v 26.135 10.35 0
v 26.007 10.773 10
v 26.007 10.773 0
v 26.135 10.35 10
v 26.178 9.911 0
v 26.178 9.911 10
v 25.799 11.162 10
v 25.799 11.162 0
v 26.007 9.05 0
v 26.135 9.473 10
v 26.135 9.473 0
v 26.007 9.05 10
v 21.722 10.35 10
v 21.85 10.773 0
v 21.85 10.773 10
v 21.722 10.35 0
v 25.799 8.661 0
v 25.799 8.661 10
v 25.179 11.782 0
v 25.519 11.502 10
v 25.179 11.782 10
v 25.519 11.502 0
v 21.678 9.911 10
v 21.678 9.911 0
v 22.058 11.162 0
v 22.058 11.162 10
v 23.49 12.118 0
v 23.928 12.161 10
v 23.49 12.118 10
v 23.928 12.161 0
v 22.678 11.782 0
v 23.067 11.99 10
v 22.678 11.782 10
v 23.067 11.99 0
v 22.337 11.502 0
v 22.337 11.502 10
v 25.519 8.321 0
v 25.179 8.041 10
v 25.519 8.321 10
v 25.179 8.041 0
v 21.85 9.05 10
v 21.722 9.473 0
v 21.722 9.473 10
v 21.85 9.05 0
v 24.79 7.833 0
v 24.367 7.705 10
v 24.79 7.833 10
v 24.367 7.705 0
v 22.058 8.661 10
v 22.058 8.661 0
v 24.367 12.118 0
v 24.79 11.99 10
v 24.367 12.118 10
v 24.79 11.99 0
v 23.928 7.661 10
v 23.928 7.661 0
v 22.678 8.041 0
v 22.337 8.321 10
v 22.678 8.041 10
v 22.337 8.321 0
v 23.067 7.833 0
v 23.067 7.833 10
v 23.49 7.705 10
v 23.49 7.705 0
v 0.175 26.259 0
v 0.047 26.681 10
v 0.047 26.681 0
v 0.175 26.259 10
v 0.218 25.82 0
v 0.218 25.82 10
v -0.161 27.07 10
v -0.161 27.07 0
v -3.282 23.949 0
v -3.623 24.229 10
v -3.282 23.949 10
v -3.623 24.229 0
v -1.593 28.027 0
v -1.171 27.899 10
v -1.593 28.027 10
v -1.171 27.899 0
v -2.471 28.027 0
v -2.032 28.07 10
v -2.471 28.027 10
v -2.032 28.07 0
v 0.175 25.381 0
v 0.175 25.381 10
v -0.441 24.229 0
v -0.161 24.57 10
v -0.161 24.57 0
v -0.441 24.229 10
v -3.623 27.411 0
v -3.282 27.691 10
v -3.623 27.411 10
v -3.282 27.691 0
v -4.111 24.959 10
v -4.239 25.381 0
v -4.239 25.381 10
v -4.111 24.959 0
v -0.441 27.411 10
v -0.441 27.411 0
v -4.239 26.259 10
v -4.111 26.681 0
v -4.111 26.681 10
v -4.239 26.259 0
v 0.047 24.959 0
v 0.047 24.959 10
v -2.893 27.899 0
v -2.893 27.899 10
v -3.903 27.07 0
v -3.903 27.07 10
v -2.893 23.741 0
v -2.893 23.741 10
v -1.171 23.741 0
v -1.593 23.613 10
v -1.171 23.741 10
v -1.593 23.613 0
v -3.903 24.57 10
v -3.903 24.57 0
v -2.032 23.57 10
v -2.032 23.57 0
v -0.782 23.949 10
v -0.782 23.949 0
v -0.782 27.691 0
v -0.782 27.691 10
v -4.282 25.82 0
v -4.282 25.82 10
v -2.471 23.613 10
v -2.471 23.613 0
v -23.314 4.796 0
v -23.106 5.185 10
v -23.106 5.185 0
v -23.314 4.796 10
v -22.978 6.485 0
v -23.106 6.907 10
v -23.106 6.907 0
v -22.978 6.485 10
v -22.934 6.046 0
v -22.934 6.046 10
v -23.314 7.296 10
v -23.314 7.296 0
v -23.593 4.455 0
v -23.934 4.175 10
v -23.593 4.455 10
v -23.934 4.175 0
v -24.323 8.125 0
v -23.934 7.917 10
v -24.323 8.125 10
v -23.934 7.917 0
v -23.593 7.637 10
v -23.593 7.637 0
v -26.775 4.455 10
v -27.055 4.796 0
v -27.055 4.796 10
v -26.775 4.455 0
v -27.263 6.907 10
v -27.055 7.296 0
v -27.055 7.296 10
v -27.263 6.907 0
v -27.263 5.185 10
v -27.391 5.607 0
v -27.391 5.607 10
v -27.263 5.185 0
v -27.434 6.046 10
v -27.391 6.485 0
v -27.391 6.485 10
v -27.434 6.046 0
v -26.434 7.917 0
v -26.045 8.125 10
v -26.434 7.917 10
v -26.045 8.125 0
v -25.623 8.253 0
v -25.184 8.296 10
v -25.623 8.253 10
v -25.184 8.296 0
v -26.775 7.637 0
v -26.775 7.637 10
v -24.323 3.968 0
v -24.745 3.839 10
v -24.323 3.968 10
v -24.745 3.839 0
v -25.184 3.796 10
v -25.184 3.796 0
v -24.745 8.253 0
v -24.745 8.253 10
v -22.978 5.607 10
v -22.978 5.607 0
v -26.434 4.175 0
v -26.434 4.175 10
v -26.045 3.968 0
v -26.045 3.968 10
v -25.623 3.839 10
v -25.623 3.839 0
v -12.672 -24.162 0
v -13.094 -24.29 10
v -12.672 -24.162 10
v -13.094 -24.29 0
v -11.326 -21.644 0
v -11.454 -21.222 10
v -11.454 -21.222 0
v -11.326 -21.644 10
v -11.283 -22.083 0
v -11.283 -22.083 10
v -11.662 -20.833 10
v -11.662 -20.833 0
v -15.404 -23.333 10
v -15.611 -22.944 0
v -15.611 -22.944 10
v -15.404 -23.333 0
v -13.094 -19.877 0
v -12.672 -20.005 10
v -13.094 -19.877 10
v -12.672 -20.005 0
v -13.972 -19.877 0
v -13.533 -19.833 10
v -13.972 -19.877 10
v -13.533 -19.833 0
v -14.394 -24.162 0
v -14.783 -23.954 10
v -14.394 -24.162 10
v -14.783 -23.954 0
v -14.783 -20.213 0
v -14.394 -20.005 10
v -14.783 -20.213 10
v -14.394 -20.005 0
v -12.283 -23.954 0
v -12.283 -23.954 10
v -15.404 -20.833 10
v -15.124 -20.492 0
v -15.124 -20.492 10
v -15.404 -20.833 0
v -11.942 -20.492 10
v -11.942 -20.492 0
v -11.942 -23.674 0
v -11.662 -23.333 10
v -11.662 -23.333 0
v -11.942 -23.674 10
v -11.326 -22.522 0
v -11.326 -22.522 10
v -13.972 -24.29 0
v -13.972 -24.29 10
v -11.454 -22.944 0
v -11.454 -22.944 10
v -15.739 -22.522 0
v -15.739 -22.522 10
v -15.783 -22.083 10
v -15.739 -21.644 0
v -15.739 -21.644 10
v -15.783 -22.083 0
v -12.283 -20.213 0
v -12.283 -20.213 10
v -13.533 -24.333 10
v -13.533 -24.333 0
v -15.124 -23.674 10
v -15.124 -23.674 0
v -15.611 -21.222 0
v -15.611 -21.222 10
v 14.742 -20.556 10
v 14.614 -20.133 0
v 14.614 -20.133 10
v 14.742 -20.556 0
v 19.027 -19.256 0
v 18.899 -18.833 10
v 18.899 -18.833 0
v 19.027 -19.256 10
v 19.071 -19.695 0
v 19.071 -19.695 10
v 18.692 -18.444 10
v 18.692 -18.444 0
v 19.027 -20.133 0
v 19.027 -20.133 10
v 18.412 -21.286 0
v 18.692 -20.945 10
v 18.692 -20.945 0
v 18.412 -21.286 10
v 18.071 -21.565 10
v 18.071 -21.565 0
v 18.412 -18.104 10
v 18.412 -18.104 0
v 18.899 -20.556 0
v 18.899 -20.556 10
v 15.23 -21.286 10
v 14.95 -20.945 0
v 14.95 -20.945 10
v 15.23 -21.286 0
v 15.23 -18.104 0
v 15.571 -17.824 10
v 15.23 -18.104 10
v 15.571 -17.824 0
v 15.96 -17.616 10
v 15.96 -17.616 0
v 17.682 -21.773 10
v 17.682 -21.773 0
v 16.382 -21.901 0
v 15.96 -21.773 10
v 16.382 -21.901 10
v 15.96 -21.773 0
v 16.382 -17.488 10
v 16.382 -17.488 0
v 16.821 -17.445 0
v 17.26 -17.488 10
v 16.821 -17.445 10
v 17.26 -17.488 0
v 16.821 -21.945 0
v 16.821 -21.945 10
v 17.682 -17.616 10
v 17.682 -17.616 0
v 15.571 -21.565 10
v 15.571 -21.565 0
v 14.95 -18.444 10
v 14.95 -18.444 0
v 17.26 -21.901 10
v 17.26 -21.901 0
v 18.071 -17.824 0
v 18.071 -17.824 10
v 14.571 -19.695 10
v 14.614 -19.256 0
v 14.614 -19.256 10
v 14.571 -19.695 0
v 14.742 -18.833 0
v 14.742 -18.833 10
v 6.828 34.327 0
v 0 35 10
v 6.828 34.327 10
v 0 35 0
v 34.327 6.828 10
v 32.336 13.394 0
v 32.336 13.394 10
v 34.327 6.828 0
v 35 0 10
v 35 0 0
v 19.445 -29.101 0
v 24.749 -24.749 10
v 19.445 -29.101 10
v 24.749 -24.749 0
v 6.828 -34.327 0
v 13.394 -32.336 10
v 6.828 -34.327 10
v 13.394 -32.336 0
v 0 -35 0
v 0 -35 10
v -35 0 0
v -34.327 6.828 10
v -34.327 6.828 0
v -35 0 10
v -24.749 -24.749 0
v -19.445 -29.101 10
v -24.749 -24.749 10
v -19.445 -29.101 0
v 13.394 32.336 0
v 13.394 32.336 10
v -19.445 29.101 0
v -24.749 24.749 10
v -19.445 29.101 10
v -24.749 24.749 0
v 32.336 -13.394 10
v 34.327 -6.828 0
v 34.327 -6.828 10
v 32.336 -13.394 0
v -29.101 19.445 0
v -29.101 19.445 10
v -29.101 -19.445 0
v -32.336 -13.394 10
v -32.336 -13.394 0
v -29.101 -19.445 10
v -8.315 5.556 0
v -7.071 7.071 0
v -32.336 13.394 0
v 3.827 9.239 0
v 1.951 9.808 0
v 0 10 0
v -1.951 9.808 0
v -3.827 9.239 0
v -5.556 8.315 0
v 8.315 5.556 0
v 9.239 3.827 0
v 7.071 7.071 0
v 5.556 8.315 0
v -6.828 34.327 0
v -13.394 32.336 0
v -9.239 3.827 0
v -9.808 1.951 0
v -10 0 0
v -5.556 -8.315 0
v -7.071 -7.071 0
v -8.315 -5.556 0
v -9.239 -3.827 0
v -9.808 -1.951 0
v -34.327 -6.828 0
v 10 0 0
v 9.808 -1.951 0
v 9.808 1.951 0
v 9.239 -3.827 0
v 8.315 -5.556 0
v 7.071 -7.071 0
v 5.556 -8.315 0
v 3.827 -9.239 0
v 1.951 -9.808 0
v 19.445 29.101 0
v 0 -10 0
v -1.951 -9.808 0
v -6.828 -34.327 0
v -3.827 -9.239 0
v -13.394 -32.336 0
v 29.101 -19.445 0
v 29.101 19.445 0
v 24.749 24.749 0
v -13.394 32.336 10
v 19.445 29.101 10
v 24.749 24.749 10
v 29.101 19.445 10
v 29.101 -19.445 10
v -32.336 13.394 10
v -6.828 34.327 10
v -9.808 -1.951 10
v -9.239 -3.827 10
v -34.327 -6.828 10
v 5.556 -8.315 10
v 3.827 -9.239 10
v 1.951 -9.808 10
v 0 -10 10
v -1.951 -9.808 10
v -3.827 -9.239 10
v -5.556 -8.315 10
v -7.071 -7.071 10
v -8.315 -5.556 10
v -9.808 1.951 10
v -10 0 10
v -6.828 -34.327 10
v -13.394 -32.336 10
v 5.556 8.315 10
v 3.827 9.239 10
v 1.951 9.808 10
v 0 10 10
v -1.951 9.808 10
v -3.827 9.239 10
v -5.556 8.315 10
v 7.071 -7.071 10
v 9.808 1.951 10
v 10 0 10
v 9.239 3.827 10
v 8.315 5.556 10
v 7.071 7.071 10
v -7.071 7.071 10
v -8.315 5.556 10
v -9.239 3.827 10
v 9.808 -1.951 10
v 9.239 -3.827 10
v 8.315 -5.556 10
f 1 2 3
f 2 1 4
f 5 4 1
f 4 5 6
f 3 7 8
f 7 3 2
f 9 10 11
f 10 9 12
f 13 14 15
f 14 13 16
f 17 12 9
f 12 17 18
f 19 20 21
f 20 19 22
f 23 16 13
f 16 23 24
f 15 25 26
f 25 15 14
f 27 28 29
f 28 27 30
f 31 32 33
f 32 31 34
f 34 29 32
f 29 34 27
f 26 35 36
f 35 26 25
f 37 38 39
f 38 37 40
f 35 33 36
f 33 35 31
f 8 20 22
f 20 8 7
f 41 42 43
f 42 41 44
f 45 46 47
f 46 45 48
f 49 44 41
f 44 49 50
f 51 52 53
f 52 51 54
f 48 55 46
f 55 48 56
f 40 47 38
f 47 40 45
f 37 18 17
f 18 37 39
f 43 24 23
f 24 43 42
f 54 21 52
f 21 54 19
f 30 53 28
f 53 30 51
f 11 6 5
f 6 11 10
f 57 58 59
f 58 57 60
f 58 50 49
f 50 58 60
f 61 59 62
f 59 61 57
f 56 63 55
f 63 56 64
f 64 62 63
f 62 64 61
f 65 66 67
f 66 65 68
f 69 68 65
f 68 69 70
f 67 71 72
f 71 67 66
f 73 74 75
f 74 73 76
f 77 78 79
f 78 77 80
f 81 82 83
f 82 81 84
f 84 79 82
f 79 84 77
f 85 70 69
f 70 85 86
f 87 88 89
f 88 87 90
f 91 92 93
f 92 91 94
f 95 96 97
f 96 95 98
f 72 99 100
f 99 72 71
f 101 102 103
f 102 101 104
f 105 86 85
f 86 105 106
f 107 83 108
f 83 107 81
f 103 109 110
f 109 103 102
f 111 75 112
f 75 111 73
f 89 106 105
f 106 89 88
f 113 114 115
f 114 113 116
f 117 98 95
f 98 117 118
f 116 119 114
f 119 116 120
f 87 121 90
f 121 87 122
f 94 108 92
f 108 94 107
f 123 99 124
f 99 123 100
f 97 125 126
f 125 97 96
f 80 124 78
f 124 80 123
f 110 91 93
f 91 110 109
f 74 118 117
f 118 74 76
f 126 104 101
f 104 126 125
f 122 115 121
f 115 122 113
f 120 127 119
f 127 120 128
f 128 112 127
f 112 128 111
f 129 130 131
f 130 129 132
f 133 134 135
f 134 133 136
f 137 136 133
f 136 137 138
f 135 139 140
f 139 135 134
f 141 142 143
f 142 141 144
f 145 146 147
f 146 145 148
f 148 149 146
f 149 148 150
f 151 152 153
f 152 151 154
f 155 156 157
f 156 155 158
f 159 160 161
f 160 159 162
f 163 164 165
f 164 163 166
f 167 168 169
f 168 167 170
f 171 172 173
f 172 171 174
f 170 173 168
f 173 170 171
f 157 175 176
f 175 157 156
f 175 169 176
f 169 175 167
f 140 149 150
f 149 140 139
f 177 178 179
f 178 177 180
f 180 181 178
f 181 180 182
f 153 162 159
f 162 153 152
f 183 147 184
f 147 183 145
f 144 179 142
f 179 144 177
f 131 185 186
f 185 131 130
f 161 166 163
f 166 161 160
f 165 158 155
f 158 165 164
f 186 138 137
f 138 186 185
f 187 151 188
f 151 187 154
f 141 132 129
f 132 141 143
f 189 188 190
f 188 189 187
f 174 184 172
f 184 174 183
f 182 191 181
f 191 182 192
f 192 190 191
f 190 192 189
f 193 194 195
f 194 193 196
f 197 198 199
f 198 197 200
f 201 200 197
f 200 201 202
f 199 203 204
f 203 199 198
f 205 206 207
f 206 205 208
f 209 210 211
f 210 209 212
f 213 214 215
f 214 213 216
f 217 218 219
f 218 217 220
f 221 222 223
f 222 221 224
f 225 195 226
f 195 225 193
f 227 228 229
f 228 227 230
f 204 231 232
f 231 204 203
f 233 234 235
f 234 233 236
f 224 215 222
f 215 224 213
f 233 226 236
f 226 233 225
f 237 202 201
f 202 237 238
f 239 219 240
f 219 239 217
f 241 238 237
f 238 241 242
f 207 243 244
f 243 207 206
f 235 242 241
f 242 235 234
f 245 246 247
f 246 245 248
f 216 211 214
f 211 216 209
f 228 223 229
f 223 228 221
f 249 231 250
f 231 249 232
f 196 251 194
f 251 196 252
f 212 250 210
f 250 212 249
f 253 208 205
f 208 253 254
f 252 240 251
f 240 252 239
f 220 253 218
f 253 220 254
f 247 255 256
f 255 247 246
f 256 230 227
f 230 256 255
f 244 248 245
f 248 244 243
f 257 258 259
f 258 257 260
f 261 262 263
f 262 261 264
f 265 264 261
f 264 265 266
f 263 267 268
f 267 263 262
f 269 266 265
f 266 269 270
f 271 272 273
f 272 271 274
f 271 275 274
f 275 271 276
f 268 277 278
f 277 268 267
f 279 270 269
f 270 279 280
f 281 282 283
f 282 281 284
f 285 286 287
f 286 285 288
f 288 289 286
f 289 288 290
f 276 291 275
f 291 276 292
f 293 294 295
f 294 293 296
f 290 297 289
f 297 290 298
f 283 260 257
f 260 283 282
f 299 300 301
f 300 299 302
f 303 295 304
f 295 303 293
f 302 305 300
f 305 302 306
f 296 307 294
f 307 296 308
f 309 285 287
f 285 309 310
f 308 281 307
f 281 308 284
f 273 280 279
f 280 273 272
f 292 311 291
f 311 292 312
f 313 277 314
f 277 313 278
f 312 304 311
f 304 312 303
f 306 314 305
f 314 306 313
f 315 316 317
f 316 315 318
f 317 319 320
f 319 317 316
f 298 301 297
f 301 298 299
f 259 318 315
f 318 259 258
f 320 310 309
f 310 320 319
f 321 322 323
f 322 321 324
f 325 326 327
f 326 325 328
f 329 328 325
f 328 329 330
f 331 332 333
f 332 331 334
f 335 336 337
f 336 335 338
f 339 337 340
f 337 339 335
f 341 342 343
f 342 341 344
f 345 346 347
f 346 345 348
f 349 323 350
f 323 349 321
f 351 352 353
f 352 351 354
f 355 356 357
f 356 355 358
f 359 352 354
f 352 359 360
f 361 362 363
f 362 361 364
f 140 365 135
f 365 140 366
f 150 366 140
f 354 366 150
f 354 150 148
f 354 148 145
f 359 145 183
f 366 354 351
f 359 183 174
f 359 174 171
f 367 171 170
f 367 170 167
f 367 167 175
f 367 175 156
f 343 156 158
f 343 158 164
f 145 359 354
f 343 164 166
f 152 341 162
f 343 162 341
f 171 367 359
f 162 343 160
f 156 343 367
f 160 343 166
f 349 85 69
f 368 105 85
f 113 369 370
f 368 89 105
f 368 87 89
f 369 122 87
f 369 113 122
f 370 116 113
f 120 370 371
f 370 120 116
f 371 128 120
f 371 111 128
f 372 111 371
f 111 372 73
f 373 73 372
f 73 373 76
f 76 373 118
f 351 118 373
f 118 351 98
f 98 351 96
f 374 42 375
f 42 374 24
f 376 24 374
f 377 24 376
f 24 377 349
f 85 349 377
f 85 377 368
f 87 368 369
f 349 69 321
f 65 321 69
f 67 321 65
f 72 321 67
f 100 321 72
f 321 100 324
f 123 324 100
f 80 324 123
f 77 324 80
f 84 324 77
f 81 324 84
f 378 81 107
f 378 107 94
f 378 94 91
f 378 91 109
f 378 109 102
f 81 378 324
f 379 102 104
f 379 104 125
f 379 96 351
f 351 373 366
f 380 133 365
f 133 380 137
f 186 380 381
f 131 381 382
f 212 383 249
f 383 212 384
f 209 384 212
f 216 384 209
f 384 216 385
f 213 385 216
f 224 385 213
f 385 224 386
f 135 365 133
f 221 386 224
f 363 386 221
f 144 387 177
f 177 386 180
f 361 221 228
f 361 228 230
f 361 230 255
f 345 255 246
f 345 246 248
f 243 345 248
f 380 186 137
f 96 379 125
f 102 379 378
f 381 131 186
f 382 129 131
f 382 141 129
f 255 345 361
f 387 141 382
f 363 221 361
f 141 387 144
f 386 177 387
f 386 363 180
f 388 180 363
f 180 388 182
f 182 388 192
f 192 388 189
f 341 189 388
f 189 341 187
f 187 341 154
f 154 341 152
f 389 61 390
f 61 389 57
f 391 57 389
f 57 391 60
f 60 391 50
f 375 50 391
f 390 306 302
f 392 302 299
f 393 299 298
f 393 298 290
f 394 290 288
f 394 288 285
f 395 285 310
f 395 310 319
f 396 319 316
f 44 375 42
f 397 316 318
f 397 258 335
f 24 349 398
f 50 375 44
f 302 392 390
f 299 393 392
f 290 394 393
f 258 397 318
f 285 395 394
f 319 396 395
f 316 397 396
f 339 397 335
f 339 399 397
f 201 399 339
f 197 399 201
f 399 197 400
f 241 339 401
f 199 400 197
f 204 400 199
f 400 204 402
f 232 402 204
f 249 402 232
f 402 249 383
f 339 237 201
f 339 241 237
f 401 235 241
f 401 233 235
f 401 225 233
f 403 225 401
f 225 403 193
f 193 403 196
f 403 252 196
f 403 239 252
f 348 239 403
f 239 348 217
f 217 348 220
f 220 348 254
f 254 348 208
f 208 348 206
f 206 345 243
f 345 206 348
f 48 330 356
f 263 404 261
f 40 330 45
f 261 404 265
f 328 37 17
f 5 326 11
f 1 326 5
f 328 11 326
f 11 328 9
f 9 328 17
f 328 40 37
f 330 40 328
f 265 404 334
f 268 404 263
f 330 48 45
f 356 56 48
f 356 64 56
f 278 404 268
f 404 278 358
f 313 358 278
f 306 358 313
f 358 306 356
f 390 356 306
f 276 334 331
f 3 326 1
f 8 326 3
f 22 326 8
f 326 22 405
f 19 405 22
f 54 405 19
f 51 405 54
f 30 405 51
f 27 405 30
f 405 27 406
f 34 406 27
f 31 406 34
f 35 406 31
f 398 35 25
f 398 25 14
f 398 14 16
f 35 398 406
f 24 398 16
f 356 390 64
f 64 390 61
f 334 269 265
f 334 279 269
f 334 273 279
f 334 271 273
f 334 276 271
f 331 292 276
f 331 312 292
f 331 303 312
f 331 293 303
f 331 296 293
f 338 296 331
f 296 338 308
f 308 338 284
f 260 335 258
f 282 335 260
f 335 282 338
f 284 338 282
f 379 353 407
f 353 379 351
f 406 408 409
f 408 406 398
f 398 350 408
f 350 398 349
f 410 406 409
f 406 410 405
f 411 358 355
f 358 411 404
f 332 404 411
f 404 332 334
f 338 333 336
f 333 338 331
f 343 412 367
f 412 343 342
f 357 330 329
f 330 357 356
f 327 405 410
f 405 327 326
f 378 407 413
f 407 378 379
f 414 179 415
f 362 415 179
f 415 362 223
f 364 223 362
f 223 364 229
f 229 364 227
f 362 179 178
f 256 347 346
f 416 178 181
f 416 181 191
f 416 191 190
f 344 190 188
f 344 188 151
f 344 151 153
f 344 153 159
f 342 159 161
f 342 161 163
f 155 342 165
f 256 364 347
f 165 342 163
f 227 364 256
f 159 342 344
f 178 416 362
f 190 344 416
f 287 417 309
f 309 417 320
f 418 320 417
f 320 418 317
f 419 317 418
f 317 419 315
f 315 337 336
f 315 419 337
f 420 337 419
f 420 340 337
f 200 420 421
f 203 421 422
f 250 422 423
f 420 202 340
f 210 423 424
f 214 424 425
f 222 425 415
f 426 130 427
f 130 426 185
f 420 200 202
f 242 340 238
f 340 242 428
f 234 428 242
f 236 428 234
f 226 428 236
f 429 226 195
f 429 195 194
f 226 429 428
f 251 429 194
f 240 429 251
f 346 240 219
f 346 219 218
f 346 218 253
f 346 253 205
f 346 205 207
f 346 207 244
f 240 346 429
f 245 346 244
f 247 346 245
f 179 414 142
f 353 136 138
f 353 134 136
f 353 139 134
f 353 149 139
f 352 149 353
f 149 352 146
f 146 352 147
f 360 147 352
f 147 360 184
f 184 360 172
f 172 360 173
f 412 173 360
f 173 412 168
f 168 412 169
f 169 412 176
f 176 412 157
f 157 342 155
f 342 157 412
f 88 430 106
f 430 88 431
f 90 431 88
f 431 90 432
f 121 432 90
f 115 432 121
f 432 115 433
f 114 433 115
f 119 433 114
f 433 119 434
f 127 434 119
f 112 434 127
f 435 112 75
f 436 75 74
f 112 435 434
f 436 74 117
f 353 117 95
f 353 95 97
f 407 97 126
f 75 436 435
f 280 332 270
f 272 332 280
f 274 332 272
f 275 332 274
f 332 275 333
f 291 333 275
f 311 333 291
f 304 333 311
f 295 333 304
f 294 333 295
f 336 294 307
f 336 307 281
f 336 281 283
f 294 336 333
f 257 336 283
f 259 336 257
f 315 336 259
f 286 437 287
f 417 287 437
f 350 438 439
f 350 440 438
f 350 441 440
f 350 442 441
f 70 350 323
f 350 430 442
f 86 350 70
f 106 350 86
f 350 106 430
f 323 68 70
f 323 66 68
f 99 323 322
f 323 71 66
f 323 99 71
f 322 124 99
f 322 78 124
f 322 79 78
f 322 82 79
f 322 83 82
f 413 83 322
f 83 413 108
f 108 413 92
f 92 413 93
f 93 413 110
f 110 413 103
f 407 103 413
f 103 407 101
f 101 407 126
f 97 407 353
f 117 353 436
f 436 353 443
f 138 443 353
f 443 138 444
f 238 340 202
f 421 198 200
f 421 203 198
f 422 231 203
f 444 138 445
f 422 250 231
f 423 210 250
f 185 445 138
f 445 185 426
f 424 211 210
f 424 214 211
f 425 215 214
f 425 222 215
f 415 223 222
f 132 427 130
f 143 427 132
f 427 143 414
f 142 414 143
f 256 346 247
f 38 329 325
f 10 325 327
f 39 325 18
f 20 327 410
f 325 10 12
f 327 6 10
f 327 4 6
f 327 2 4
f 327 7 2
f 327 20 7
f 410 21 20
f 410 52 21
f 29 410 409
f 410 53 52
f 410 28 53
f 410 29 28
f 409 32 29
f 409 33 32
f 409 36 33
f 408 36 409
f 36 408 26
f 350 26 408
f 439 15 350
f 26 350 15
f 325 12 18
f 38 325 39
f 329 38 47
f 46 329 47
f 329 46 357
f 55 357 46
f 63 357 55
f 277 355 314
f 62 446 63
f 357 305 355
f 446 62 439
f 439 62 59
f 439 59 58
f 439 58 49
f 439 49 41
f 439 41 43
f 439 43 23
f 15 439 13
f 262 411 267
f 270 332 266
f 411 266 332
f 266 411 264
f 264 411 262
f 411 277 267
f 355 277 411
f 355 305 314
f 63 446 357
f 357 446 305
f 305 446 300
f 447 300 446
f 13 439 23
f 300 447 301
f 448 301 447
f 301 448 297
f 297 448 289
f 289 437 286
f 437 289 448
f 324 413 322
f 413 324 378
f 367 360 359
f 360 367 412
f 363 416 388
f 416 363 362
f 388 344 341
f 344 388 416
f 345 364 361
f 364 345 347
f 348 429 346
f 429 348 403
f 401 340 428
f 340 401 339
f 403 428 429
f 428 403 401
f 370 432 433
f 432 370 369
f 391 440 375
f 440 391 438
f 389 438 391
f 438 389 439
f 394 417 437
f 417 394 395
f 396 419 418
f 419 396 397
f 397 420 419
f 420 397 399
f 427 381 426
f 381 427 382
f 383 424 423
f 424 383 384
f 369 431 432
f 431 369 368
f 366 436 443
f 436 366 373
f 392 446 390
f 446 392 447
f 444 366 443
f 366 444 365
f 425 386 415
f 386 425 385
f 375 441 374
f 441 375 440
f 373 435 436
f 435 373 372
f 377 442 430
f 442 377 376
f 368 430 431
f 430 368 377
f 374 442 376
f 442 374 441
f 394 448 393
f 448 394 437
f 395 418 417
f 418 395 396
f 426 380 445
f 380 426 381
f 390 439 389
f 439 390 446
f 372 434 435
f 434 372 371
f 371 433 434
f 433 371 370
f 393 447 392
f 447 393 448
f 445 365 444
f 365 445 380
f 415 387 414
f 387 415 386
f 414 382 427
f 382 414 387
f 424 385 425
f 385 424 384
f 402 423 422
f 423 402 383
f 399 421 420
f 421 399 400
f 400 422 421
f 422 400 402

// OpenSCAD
$fn = 32;

// ----------------------------------------------------------------------
// Flange Ø70 x 10
// 5 holes on a Ø51.8 bolt circle, bolted joints
// ----------------------------------------------------------------------

// --- parameters (mm) ---
flange_d = 70;     // outside diameter of the flange
thickness = 10;    // flange thickness
holes = 5;         // number of bolt holes
pcd = 51.8;        // bolt circle diameter
start_deg = 22.5;  // angle of the first hole, from +X
hole_d = 4.5;      // bolt hole diameter
bore_d = 20;       // central through bore
hub_d = 28;        // hub outside diameter
hub_h = 0;         // hub height above the flange face (0 = no hub)

// --- derived feature positions (mm) ---
height = thickness + hub_h;  // = 10   overall height of the part
pcd_r = pcd / 2;             // = 25.9   bolt circle radius
hole_step = 360 / holes;     // = 72   angular pitch
feature_centers = [
  [pcd_r * cos(start_deg + 0 * hole_step), pcd_r * sin(start_deg + 0 * hole_step)],
  [pcd_r * cos(start_deg + 1 * hole_step), pcd_r * sin(start_deg + 1 * hole_step)],
  [pcd_r * cos(start_deg + 2 * hole_step), pcd_r * sin(start_deg + 2 * hole_step)],
  [pcd_r * cos(start_deg + 3 * hole_step), pcd_r * sin(start_deg + 3 * hole_step)],
  [pcd_r * cos(start_deg + 4 * hole_step), pcd_r * sin(start_deg + 4 * hole_step)]
];   // bolt hole centres on the pitch circle

// flange disc, every hole and the bore cut straight through
difference() {
  union() {
    cylinder(d = flange_d, h = thickness);
  }
  translate([0, 0, -1]) cylinder(d = bore_d, h = height + 2);  // bore, through
  for (centre = feature_centers)
    translate([centre[0], centre[1], -1]) cylinder(d = hole_d, h = thickness + 2);
}
